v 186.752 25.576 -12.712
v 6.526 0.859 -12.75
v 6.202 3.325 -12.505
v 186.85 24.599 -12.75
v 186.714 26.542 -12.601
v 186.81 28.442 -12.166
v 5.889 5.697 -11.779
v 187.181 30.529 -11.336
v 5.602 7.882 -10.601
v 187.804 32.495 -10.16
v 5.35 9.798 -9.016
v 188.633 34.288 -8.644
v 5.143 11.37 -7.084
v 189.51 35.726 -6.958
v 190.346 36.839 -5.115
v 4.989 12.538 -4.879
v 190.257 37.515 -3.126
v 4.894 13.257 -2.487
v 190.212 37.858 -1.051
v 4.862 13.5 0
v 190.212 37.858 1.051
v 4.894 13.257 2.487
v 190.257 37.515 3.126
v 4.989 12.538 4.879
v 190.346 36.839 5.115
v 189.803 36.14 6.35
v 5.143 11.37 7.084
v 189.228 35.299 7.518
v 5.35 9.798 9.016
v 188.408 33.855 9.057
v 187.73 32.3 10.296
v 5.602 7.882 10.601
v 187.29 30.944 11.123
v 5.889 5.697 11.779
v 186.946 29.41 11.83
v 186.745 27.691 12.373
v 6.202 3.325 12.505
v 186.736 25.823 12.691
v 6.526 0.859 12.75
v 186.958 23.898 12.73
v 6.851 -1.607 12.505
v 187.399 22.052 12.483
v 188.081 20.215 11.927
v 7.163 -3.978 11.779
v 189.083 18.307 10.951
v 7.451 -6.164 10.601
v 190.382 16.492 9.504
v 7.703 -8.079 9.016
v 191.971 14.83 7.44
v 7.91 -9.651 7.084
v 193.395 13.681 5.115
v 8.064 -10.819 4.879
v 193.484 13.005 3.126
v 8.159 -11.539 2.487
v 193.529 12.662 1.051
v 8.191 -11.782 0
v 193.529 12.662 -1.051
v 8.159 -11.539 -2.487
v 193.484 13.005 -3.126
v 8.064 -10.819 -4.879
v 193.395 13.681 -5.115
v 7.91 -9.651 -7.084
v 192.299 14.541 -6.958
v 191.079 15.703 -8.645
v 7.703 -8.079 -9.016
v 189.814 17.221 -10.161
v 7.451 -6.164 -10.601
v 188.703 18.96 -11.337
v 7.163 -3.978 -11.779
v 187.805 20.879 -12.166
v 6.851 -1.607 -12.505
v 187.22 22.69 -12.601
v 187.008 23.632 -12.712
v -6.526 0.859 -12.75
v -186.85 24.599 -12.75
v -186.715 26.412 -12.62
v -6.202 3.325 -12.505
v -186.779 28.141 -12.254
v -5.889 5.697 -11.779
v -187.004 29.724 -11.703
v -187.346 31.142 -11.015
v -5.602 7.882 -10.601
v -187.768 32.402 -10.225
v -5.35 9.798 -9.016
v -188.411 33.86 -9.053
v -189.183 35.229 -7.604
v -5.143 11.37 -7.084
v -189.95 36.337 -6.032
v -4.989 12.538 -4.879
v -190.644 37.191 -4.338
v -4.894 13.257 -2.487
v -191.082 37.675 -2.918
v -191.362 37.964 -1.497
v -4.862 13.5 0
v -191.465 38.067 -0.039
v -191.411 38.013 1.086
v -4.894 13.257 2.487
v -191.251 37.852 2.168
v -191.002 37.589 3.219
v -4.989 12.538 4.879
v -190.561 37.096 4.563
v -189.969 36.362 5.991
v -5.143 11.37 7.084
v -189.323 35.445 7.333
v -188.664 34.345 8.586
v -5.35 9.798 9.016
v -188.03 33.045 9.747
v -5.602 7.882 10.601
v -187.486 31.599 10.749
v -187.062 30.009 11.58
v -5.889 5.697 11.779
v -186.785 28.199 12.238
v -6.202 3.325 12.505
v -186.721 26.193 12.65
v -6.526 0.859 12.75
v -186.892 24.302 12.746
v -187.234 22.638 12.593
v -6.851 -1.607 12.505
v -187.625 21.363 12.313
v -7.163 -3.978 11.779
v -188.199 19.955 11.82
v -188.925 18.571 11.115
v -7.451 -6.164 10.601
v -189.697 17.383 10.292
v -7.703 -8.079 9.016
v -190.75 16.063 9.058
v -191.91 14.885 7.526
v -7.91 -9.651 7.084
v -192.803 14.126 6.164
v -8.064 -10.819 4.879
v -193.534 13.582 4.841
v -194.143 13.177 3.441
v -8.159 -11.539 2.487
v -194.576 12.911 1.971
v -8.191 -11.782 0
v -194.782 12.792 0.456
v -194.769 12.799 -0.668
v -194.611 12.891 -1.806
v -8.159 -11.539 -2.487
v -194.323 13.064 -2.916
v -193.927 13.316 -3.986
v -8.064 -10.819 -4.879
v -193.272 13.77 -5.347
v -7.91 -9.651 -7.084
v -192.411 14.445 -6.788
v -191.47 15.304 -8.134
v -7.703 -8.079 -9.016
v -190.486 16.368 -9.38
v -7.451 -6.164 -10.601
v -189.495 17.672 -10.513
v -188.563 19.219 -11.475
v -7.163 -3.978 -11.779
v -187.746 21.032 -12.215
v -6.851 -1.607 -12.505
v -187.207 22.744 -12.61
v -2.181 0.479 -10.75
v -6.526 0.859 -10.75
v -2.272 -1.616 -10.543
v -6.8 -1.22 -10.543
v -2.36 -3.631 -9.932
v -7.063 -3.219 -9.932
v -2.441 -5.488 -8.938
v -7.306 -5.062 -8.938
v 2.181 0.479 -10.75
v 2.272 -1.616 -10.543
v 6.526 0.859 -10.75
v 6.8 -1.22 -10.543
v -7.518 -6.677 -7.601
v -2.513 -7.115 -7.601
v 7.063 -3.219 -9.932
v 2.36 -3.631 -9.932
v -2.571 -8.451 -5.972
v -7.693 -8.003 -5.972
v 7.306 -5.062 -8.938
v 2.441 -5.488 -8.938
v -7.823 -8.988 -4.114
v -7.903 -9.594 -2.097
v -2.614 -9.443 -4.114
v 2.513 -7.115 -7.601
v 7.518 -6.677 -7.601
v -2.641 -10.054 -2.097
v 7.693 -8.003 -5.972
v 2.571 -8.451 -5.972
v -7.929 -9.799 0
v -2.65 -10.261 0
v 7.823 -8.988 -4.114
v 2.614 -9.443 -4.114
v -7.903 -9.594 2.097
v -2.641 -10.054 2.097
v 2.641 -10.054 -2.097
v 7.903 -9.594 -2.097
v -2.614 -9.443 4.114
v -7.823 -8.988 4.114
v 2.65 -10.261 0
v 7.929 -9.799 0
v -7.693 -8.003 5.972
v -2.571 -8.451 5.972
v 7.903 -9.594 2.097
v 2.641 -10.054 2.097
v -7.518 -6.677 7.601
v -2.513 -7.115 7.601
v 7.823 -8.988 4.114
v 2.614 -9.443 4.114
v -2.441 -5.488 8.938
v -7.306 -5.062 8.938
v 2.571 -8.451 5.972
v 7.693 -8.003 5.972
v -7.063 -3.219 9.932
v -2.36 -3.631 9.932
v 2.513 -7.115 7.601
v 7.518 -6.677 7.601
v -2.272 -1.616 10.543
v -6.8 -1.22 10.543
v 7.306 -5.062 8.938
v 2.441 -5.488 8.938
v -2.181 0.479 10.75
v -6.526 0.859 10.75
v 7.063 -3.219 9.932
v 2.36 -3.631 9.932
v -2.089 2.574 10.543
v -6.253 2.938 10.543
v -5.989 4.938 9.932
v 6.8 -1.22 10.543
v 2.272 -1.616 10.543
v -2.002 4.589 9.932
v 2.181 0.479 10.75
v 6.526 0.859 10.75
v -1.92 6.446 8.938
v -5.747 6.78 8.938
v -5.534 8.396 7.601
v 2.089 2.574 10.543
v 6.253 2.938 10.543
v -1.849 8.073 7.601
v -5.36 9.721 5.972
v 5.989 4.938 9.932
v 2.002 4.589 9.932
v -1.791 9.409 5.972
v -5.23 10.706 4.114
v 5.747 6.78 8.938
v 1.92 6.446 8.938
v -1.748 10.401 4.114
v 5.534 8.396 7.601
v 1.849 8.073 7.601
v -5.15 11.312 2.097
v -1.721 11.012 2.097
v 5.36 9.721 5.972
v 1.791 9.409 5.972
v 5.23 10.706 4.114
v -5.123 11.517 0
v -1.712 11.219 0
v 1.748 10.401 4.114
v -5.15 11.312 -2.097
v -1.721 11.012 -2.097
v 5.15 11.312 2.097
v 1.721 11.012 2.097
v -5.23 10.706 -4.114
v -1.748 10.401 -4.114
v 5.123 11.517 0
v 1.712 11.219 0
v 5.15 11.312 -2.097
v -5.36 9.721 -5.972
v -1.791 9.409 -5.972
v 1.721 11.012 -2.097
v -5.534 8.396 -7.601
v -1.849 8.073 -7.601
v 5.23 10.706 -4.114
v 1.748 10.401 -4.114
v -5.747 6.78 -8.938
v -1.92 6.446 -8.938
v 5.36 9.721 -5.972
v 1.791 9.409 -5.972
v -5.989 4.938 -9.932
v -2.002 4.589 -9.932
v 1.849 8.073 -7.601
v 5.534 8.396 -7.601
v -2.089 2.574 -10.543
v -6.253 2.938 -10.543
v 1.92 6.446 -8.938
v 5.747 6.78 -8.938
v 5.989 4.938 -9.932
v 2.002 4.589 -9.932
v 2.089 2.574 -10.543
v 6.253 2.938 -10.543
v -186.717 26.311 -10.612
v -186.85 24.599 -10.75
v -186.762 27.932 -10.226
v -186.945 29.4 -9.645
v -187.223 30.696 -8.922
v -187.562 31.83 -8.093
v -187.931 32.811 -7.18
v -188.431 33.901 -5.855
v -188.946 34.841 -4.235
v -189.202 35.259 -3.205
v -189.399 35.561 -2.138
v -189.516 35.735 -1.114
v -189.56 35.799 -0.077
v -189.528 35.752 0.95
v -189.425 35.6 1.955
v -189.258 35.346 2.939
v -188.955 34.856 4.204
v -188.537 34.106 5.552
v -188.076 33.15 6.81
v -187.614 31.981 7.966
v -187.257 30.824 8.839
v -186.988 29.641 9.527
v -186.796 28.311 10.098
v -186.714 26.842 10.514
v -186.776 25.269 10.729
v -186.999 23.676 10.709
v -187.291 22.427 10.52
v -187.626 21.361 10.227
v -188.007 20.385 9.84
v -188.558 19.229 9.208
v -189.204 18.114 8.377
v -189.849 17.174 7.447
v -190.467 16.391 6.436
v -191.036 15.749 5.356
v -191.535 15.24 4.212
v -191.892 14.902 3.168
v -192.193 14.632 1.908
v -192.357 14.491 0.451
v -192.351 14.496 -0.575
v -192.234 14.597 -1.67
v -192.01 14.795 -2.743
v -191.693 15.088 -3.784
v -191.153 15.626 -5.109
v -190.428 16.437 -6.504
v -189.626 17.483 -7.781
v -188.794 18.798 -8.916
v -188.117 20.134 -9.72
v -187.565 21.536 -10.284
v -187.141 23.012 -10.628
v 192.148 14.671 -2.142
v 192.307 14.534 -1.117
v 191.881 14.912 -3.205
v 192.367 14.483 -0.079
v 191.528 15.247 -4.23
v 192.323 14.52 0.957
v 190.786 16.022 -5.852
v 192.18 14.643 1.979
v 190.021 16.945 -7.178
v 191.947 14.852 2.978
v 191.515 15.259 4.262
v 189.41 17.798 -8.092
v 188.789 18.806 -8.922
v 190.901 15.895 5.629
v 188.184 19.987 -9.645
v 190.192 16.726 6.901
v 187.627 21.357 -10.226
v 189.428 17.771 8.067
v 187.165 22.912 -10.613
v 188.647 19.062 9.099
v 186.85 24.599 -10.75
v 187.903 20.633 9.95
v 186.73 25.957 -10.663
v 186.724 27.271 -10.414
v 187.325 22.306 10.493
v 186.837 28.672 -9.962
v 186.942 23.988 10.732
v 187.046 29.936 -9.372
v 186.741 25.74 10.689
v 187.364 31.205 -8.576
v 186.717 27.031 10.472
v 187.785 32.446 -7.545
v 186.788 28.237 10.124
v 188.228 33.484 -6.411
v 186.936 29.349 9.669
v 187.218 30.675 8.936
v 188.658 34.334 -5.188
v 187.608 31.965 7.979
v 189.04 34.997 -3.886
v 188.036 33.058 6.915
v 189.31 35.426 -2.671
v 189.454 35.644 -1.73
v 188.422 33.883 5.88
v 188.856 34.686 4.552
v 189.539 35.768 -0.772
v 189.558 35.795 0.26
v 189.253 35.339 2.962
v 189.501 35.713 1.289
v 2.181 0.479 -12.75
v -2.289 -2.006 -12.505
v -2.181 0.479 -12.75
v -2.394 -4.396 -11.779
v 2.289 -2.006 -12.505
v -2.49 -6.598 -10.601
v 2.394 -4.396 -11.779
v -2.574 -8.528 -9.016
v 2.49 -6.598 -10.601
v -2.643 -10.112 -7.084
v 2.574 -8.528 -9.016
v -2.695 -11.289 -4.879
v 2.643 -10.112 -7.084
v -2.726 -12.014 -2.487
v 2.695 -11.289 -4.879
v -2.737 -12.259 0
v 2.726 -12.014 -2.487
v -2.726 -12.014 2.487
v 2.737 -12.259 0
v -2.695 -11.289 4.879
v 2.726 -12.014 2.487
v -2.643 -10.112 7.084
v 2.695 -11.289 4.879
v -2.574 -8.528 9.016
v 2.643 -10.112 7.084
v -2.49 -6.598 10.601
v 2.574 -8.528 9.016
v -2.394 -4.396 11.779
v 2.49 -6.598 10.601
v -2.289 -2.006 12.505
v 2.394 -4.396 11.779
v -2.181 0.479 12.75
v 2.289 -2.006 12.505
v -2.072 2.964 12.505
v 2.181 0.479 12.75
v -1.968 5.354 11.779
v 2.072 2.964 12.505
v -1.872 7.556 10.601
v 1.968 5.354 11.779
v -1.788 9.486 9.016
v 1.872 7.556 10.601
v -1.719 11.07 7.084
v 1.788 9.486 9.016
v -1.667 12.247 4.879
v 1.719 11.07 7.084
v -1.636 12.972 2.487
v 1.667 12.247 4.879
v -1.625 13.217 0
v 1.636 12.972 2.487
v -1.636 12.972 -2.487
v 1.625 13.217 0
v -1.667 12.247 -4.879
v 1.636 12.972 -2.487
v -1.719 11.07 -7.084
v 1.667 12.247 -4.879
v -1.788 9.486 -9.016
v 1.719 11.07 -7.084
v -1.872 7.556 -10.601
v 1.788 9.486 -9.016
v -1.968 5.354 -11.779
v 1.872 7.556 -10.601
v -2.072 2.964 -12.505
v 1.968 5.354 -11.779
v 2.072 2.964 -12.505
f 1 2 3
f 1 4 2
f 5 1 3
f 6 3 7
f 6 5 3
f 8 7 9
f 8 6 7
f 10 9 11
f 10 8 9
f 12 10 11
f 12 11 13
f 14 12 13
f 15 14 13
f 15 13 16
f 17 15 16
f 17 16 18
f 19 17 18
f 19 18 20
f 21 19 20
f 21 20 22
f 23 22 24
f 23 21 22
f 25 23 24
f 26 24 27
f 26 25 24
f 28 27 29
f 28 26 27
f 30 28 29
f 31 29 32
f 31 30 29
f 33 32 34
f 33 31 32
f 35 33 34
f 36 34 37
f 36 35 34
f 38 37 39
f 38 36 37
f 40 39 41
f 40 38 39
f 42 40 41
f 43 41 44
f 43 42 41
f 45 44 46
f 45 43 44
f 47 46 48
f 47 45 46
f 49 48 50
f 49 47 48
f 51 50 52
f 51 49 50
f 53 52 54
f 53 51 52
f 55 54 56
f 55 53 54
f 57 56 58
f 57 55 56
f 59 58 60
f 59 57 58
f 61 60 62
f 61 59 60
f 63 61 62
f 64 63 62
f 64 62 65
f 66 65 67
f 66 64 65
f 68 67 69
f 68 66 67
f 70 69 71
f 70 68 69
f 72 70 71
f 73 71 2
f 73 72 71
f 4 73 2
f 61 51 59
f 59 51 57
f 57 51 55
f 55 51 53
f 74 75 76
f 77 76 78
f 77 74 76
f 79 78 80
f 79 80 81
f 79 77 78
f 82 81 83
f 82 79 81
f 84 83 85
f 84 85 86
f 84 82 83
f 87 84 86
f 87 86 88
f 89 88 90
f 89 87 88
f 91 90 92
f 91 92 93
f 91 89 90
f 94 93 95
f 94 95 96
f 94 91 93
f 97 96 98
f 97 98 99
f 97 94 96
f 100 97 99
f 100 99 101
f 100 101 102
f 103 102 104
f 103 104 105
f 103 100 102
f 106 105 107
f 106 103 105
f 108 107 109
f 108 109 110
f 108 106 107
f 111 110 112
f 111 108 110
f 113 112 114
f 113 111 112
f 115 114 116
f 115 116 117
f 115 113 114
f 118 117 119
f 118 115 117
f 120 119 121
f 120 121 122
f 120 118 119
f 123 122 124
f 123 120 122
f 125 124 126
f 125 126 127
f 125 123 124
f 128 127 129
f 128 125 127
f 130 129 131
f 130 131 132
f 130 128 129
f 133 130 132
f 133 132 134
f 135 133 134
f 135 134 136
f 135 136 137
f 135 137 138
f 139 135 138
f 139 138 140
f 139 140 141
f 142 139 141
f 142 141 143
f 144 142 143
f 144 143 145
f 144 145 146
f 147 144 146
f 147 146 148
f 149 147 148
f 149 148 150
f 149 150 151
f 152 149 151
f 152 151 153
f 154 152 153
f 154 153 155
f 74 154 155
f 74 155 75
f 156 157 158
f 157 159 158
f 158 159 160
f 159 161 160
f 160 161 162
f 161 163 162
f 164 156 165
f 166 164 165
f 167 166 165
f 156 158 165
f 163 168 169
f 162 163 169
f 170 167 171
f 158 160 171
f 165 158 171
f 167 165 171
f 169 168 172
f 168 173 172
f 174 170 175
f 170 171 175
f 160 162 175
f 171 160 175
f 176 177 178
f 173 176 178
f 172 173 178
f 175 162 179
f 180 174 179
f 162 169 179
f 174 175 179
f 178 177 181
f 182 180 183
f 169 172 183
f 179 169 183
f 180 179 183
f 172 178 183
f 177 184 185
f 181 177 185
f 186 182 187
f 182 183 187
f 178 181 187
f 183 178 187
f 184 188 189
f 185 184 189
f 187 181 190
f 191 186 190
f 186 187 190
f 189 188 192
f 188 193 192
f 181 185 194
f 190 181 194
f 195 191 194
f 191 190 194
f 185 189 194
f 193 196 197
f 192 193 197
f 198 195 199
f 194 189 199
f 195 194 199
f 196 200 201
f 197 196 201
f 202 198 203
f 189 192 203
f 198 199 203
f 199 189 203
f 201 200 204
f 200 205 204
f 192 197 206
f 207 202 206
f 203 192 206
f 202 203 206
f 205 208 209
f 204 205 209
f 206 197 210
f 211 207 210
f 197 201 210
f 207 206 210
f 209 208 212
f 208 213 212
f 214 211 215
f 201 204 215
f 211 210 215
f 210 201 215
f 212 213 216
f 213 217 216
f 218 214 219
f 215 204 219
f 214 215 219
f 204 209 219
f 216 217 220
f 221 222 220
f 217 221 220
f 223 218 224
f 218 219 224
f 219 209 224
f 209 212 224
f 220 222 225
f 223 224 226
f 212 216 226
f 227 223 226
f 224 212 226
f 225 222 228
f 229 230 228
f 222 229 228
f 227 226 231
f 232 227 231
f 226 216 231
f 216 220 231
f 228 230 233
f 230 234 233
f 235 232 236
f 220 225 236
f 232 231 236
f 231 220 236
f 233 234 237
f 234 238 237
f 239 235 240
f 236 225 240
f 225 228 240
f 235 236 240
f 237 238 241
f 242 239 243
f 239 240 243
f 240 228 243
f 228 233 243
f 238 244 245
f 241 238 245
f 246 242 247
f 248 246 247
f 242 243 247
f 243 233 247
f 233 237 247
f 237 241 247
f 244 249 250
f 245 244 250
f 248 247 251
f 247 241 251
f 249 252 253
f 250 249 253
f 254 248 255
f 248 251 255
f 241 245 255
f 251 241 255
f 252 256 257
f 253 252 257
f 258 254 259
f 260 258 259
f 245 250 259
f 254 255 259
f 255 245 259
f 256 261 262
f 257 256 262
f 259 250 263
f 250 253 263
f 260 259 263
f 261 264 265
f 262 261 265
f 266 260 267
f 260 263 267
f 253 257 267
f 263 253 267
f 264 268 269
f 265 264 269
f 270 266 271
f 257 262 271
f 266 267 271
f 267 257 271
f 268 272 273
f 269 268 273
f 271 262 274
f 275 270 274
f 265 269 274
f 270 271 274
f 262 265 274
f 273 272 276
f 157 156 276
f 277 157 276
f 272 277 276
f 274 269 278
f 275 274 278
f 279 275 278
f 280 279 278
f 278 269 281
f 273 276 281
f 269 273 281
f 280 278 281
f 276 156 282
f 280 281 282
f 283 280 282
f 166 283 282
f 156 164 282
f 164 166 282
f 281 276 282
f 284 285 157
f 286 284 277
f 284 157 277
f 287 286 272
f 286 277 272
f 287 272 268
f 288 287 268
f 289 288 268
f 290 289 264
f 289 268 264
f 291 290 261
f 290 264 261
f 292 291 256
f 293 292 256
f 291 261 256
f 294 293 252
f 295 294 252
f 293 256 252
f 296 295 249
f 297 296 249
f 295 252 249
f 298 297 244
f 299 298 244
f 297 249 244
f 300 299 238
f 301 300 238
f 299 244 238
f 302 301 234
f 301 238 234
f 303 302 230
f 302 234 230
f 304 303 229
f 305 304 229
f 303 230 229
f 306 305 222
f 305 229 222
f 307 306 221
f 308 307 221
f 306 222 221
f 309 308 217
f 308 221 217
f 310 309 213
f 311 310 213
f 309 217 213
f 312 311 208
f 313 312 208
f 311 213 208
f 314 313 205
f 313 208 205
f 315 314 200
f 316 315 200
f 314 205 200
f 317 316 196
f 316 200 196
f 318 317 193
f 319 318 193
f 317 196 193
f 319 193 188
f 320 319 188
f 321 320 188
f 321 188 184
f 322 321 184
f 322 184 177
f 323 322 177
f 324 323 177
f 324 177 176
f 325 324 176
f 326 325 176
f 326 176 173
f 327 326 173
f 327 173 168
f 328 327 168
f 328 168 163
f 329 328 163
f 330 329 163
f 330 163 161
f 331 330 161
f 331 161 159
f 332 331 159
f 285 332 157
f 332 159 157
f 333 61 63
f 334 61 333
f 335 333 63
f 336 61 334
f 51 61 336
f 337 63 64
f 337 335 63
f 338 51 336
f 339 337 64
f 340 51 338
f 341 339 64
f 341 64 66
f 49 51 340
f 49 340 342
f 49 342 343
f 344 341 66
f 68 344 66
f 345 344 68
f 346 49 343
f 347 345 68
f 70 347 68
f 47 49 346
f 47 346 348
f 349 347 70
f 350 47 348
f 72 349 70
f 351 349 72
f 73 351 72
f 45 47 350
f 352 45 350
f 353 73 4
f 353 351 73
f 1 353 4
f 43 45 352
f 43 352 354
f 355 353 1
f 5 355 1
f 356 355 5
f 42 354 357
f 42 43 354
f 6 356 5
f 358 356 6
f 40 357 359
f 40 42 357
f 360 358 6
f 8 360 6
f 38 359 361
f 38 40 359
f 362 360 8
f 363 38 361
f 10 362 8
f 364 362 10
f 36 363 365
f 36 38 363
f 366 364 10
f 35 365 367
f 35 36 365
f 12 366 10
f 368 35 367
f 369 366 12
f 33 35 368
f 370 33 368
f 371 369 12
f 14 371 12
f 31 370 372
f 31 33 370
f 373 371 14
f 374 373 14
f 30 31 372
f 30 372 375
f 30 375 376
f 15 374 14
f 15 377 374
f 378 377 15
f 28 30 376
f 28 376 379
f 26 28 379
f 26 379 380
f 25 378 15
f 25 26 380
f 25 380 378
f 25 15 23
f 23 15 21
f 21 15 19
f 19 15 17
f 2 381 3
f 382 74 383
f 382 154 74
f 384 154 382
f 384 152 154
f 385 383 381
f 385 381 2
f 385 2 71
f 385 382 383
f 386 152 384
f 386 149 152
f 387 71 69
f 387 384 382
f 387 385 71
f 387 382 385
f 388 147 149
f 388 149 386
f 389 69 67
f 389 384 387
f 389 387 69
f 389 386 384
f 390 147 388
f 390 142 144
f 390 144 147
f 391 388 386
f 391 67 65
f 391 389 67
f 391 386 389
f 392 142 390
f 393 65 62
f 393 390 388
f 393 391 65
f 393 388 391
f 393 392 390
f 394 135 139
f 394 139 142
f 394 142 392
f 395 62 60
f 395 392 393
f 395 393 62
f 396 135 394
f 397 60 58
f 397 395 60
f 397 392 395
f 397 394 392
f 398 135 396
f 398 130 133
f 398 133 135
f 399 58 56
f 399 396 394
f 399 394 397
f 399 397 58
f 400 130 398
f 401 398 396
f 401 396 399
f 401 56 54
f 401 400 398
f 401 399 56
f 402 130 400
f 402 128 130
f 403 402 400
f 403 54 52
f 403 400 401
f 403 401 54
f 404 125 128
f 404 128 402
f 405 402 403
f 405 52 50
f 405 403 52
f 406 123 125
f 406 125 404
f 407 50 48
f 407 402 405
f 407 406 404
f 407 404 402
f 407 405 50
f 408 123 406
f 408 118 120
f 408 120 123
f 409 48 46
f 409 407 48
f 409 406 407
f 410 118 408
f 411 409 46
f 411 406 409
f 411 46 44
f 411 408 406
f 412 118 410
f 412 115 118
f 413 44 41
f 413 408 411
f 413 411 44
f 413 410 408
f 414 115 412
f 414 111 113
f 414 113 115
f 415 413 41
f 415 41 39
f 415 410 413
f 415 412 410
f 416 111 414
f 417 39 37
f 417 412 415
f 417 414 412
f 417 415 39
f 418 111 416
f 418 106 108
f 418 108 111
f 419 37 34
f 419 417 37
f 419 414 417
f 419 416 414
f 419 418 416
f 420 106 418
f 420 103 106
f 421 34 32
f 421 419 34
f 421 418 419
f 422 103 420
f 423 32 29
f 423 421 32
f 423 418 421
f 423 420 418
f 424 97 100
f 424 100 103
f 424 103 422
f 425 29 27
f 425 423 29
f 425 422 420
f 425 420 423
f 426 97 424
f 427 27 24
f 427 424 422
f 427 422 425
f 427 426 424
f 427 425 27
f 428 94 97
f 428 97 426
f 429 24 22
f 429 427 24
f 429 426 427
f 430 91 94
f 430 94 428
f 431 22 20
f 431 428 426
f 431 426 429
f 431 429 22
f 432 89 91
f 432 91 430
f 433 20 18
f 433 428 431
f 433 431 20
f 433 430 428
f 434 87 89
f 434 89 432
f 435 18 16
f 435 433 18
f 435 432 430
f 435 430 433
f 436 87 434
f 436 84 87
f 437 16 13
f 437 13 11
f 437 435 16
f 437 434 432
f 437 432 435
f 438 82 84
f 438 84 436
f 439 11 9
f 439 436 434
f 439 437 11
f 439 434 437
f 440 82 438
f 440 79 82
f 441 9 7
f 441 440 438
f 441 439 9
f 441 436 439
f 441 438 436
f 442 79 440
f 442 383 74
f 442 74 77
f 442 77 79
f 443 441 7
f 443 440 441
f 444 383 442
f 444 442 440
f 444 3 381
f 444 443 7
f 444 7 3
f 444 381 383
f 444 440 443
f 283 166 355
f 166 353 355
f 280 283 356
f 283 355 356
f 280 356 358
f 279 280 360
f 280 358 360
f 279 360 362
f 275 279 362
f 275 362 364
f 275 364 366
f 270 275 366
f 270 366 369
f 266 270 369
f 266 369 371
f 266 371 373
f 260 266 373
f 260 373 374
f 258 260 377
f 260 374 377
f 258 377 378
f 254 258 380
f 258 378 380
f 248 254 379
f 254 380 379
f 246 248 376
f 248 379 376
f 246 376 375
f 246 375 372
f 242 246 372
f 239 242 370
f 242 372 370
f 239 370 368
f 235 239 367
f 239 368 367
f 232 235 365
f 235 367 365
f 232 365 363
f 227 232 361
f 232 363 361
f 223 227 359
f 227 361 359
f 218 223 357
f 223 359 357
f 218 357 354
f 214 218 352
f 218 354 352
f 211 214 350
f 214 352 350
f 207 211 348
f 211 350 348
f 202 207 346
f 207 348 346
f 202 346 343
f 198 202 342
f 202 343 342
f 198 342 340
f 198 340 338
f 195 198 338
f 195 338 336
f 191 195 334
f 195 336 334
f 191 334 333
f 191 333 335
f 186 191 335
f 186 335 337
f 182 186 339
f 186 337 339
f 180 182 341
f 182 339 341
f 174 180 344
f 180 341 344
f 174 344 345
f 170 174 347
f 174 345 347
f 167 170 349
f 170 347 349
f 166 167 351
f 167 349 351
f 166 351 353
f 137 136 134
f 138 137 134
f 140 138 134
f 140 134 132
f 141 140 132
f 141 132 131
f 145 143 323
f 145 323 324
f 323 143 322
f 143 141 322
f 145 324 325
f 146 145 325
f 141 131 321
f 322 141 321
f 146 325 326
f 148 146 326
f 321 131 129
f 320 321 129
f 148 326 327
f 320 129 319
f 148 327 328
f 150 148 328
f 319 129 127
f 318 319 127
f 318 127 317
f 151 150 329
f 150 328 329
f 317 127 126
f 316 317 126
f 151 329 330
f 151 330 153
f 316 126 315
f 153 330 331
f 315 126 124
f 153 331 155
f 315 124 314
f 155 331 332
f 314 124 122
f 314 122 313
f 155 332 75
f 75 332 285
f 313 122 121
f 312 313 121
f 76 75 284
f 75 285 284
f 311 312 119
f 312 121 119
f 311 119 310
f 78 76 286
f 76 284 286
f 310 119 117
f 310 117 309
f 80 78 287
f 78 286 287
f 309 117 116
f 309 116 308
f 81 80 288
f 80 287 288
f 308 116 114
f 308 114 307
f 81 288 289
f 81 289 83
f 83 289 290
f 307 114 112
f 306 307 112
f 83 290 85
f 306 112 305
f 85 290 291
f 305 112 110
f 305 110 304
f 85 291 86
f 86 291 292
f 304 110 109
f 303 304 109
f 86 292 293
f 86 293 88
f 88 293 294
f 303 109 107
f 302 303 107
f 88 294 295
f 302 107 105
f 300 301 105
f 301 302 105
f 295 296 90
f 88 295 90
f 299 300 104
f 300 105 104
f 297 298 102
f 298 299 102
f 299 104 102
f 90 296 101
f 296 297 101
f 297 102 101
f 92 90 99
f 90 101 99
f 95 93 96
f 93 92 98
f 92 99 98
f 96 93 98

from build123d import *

# Parameters (mm, degrees)
ESBO_O2_R             = 12.75
ESBO_O2_R_2           = 10.75
ESBO_O3_R             = 16
CORTE_EXTRUS_O1_DEPTH = 35


with BuildPart() as part:
    # Varredura1: sweep along a path in Esboço1
    with BuildLine(Plane.XY) as varredura1_path:
        Line((-193.129443739, 25.425973626), (-6.526309611, 0.85920496))
        ThreePointArc((-6.526309611, 0.85920496), (0, 0.431448029), (6.526309611, 0.85920496))
        Line((6.526309611, 0.85920496), (191.870520585, 25.260233248))
    # Esboço2 → Varredura1 (sweep)
    with BuildSketch(Plane(origin=(191.870520585, 25.260233248, 0), x_dir=(0, 0, -1), z_dir=(0.9914448613738109, 0.13052619222004852, 0))):
        Circle(ESBO_O2_R)
        Circle(ESBO_O2_R_2, mode=Mode.SUBTRACT)
    sweep(path=varredura1_path.line)

    # Esboço3 → Corte-extrusão1 (cut, symmetric)
    with BuildSketch(Plane.XY):
        with Locations((-202.713054604, 26.687679932)):
            Circle(ESBO_O3_R)
    corte_extrus_o1 = extrude(amount=CORTE_EXTRUS_O1_DEPTH, both=True, mode=Mode.SUBTRACT)

    # Espelhar1: Corte-extrusão1 across plane
    add(corte_extrus_o1.mirror(Plane(origin=(0, 0, 0), x_dir=(0, 0, 1), z_dir=(1, 0, 0))), mode=Mode.SUBTRACT)


solid = part.part
